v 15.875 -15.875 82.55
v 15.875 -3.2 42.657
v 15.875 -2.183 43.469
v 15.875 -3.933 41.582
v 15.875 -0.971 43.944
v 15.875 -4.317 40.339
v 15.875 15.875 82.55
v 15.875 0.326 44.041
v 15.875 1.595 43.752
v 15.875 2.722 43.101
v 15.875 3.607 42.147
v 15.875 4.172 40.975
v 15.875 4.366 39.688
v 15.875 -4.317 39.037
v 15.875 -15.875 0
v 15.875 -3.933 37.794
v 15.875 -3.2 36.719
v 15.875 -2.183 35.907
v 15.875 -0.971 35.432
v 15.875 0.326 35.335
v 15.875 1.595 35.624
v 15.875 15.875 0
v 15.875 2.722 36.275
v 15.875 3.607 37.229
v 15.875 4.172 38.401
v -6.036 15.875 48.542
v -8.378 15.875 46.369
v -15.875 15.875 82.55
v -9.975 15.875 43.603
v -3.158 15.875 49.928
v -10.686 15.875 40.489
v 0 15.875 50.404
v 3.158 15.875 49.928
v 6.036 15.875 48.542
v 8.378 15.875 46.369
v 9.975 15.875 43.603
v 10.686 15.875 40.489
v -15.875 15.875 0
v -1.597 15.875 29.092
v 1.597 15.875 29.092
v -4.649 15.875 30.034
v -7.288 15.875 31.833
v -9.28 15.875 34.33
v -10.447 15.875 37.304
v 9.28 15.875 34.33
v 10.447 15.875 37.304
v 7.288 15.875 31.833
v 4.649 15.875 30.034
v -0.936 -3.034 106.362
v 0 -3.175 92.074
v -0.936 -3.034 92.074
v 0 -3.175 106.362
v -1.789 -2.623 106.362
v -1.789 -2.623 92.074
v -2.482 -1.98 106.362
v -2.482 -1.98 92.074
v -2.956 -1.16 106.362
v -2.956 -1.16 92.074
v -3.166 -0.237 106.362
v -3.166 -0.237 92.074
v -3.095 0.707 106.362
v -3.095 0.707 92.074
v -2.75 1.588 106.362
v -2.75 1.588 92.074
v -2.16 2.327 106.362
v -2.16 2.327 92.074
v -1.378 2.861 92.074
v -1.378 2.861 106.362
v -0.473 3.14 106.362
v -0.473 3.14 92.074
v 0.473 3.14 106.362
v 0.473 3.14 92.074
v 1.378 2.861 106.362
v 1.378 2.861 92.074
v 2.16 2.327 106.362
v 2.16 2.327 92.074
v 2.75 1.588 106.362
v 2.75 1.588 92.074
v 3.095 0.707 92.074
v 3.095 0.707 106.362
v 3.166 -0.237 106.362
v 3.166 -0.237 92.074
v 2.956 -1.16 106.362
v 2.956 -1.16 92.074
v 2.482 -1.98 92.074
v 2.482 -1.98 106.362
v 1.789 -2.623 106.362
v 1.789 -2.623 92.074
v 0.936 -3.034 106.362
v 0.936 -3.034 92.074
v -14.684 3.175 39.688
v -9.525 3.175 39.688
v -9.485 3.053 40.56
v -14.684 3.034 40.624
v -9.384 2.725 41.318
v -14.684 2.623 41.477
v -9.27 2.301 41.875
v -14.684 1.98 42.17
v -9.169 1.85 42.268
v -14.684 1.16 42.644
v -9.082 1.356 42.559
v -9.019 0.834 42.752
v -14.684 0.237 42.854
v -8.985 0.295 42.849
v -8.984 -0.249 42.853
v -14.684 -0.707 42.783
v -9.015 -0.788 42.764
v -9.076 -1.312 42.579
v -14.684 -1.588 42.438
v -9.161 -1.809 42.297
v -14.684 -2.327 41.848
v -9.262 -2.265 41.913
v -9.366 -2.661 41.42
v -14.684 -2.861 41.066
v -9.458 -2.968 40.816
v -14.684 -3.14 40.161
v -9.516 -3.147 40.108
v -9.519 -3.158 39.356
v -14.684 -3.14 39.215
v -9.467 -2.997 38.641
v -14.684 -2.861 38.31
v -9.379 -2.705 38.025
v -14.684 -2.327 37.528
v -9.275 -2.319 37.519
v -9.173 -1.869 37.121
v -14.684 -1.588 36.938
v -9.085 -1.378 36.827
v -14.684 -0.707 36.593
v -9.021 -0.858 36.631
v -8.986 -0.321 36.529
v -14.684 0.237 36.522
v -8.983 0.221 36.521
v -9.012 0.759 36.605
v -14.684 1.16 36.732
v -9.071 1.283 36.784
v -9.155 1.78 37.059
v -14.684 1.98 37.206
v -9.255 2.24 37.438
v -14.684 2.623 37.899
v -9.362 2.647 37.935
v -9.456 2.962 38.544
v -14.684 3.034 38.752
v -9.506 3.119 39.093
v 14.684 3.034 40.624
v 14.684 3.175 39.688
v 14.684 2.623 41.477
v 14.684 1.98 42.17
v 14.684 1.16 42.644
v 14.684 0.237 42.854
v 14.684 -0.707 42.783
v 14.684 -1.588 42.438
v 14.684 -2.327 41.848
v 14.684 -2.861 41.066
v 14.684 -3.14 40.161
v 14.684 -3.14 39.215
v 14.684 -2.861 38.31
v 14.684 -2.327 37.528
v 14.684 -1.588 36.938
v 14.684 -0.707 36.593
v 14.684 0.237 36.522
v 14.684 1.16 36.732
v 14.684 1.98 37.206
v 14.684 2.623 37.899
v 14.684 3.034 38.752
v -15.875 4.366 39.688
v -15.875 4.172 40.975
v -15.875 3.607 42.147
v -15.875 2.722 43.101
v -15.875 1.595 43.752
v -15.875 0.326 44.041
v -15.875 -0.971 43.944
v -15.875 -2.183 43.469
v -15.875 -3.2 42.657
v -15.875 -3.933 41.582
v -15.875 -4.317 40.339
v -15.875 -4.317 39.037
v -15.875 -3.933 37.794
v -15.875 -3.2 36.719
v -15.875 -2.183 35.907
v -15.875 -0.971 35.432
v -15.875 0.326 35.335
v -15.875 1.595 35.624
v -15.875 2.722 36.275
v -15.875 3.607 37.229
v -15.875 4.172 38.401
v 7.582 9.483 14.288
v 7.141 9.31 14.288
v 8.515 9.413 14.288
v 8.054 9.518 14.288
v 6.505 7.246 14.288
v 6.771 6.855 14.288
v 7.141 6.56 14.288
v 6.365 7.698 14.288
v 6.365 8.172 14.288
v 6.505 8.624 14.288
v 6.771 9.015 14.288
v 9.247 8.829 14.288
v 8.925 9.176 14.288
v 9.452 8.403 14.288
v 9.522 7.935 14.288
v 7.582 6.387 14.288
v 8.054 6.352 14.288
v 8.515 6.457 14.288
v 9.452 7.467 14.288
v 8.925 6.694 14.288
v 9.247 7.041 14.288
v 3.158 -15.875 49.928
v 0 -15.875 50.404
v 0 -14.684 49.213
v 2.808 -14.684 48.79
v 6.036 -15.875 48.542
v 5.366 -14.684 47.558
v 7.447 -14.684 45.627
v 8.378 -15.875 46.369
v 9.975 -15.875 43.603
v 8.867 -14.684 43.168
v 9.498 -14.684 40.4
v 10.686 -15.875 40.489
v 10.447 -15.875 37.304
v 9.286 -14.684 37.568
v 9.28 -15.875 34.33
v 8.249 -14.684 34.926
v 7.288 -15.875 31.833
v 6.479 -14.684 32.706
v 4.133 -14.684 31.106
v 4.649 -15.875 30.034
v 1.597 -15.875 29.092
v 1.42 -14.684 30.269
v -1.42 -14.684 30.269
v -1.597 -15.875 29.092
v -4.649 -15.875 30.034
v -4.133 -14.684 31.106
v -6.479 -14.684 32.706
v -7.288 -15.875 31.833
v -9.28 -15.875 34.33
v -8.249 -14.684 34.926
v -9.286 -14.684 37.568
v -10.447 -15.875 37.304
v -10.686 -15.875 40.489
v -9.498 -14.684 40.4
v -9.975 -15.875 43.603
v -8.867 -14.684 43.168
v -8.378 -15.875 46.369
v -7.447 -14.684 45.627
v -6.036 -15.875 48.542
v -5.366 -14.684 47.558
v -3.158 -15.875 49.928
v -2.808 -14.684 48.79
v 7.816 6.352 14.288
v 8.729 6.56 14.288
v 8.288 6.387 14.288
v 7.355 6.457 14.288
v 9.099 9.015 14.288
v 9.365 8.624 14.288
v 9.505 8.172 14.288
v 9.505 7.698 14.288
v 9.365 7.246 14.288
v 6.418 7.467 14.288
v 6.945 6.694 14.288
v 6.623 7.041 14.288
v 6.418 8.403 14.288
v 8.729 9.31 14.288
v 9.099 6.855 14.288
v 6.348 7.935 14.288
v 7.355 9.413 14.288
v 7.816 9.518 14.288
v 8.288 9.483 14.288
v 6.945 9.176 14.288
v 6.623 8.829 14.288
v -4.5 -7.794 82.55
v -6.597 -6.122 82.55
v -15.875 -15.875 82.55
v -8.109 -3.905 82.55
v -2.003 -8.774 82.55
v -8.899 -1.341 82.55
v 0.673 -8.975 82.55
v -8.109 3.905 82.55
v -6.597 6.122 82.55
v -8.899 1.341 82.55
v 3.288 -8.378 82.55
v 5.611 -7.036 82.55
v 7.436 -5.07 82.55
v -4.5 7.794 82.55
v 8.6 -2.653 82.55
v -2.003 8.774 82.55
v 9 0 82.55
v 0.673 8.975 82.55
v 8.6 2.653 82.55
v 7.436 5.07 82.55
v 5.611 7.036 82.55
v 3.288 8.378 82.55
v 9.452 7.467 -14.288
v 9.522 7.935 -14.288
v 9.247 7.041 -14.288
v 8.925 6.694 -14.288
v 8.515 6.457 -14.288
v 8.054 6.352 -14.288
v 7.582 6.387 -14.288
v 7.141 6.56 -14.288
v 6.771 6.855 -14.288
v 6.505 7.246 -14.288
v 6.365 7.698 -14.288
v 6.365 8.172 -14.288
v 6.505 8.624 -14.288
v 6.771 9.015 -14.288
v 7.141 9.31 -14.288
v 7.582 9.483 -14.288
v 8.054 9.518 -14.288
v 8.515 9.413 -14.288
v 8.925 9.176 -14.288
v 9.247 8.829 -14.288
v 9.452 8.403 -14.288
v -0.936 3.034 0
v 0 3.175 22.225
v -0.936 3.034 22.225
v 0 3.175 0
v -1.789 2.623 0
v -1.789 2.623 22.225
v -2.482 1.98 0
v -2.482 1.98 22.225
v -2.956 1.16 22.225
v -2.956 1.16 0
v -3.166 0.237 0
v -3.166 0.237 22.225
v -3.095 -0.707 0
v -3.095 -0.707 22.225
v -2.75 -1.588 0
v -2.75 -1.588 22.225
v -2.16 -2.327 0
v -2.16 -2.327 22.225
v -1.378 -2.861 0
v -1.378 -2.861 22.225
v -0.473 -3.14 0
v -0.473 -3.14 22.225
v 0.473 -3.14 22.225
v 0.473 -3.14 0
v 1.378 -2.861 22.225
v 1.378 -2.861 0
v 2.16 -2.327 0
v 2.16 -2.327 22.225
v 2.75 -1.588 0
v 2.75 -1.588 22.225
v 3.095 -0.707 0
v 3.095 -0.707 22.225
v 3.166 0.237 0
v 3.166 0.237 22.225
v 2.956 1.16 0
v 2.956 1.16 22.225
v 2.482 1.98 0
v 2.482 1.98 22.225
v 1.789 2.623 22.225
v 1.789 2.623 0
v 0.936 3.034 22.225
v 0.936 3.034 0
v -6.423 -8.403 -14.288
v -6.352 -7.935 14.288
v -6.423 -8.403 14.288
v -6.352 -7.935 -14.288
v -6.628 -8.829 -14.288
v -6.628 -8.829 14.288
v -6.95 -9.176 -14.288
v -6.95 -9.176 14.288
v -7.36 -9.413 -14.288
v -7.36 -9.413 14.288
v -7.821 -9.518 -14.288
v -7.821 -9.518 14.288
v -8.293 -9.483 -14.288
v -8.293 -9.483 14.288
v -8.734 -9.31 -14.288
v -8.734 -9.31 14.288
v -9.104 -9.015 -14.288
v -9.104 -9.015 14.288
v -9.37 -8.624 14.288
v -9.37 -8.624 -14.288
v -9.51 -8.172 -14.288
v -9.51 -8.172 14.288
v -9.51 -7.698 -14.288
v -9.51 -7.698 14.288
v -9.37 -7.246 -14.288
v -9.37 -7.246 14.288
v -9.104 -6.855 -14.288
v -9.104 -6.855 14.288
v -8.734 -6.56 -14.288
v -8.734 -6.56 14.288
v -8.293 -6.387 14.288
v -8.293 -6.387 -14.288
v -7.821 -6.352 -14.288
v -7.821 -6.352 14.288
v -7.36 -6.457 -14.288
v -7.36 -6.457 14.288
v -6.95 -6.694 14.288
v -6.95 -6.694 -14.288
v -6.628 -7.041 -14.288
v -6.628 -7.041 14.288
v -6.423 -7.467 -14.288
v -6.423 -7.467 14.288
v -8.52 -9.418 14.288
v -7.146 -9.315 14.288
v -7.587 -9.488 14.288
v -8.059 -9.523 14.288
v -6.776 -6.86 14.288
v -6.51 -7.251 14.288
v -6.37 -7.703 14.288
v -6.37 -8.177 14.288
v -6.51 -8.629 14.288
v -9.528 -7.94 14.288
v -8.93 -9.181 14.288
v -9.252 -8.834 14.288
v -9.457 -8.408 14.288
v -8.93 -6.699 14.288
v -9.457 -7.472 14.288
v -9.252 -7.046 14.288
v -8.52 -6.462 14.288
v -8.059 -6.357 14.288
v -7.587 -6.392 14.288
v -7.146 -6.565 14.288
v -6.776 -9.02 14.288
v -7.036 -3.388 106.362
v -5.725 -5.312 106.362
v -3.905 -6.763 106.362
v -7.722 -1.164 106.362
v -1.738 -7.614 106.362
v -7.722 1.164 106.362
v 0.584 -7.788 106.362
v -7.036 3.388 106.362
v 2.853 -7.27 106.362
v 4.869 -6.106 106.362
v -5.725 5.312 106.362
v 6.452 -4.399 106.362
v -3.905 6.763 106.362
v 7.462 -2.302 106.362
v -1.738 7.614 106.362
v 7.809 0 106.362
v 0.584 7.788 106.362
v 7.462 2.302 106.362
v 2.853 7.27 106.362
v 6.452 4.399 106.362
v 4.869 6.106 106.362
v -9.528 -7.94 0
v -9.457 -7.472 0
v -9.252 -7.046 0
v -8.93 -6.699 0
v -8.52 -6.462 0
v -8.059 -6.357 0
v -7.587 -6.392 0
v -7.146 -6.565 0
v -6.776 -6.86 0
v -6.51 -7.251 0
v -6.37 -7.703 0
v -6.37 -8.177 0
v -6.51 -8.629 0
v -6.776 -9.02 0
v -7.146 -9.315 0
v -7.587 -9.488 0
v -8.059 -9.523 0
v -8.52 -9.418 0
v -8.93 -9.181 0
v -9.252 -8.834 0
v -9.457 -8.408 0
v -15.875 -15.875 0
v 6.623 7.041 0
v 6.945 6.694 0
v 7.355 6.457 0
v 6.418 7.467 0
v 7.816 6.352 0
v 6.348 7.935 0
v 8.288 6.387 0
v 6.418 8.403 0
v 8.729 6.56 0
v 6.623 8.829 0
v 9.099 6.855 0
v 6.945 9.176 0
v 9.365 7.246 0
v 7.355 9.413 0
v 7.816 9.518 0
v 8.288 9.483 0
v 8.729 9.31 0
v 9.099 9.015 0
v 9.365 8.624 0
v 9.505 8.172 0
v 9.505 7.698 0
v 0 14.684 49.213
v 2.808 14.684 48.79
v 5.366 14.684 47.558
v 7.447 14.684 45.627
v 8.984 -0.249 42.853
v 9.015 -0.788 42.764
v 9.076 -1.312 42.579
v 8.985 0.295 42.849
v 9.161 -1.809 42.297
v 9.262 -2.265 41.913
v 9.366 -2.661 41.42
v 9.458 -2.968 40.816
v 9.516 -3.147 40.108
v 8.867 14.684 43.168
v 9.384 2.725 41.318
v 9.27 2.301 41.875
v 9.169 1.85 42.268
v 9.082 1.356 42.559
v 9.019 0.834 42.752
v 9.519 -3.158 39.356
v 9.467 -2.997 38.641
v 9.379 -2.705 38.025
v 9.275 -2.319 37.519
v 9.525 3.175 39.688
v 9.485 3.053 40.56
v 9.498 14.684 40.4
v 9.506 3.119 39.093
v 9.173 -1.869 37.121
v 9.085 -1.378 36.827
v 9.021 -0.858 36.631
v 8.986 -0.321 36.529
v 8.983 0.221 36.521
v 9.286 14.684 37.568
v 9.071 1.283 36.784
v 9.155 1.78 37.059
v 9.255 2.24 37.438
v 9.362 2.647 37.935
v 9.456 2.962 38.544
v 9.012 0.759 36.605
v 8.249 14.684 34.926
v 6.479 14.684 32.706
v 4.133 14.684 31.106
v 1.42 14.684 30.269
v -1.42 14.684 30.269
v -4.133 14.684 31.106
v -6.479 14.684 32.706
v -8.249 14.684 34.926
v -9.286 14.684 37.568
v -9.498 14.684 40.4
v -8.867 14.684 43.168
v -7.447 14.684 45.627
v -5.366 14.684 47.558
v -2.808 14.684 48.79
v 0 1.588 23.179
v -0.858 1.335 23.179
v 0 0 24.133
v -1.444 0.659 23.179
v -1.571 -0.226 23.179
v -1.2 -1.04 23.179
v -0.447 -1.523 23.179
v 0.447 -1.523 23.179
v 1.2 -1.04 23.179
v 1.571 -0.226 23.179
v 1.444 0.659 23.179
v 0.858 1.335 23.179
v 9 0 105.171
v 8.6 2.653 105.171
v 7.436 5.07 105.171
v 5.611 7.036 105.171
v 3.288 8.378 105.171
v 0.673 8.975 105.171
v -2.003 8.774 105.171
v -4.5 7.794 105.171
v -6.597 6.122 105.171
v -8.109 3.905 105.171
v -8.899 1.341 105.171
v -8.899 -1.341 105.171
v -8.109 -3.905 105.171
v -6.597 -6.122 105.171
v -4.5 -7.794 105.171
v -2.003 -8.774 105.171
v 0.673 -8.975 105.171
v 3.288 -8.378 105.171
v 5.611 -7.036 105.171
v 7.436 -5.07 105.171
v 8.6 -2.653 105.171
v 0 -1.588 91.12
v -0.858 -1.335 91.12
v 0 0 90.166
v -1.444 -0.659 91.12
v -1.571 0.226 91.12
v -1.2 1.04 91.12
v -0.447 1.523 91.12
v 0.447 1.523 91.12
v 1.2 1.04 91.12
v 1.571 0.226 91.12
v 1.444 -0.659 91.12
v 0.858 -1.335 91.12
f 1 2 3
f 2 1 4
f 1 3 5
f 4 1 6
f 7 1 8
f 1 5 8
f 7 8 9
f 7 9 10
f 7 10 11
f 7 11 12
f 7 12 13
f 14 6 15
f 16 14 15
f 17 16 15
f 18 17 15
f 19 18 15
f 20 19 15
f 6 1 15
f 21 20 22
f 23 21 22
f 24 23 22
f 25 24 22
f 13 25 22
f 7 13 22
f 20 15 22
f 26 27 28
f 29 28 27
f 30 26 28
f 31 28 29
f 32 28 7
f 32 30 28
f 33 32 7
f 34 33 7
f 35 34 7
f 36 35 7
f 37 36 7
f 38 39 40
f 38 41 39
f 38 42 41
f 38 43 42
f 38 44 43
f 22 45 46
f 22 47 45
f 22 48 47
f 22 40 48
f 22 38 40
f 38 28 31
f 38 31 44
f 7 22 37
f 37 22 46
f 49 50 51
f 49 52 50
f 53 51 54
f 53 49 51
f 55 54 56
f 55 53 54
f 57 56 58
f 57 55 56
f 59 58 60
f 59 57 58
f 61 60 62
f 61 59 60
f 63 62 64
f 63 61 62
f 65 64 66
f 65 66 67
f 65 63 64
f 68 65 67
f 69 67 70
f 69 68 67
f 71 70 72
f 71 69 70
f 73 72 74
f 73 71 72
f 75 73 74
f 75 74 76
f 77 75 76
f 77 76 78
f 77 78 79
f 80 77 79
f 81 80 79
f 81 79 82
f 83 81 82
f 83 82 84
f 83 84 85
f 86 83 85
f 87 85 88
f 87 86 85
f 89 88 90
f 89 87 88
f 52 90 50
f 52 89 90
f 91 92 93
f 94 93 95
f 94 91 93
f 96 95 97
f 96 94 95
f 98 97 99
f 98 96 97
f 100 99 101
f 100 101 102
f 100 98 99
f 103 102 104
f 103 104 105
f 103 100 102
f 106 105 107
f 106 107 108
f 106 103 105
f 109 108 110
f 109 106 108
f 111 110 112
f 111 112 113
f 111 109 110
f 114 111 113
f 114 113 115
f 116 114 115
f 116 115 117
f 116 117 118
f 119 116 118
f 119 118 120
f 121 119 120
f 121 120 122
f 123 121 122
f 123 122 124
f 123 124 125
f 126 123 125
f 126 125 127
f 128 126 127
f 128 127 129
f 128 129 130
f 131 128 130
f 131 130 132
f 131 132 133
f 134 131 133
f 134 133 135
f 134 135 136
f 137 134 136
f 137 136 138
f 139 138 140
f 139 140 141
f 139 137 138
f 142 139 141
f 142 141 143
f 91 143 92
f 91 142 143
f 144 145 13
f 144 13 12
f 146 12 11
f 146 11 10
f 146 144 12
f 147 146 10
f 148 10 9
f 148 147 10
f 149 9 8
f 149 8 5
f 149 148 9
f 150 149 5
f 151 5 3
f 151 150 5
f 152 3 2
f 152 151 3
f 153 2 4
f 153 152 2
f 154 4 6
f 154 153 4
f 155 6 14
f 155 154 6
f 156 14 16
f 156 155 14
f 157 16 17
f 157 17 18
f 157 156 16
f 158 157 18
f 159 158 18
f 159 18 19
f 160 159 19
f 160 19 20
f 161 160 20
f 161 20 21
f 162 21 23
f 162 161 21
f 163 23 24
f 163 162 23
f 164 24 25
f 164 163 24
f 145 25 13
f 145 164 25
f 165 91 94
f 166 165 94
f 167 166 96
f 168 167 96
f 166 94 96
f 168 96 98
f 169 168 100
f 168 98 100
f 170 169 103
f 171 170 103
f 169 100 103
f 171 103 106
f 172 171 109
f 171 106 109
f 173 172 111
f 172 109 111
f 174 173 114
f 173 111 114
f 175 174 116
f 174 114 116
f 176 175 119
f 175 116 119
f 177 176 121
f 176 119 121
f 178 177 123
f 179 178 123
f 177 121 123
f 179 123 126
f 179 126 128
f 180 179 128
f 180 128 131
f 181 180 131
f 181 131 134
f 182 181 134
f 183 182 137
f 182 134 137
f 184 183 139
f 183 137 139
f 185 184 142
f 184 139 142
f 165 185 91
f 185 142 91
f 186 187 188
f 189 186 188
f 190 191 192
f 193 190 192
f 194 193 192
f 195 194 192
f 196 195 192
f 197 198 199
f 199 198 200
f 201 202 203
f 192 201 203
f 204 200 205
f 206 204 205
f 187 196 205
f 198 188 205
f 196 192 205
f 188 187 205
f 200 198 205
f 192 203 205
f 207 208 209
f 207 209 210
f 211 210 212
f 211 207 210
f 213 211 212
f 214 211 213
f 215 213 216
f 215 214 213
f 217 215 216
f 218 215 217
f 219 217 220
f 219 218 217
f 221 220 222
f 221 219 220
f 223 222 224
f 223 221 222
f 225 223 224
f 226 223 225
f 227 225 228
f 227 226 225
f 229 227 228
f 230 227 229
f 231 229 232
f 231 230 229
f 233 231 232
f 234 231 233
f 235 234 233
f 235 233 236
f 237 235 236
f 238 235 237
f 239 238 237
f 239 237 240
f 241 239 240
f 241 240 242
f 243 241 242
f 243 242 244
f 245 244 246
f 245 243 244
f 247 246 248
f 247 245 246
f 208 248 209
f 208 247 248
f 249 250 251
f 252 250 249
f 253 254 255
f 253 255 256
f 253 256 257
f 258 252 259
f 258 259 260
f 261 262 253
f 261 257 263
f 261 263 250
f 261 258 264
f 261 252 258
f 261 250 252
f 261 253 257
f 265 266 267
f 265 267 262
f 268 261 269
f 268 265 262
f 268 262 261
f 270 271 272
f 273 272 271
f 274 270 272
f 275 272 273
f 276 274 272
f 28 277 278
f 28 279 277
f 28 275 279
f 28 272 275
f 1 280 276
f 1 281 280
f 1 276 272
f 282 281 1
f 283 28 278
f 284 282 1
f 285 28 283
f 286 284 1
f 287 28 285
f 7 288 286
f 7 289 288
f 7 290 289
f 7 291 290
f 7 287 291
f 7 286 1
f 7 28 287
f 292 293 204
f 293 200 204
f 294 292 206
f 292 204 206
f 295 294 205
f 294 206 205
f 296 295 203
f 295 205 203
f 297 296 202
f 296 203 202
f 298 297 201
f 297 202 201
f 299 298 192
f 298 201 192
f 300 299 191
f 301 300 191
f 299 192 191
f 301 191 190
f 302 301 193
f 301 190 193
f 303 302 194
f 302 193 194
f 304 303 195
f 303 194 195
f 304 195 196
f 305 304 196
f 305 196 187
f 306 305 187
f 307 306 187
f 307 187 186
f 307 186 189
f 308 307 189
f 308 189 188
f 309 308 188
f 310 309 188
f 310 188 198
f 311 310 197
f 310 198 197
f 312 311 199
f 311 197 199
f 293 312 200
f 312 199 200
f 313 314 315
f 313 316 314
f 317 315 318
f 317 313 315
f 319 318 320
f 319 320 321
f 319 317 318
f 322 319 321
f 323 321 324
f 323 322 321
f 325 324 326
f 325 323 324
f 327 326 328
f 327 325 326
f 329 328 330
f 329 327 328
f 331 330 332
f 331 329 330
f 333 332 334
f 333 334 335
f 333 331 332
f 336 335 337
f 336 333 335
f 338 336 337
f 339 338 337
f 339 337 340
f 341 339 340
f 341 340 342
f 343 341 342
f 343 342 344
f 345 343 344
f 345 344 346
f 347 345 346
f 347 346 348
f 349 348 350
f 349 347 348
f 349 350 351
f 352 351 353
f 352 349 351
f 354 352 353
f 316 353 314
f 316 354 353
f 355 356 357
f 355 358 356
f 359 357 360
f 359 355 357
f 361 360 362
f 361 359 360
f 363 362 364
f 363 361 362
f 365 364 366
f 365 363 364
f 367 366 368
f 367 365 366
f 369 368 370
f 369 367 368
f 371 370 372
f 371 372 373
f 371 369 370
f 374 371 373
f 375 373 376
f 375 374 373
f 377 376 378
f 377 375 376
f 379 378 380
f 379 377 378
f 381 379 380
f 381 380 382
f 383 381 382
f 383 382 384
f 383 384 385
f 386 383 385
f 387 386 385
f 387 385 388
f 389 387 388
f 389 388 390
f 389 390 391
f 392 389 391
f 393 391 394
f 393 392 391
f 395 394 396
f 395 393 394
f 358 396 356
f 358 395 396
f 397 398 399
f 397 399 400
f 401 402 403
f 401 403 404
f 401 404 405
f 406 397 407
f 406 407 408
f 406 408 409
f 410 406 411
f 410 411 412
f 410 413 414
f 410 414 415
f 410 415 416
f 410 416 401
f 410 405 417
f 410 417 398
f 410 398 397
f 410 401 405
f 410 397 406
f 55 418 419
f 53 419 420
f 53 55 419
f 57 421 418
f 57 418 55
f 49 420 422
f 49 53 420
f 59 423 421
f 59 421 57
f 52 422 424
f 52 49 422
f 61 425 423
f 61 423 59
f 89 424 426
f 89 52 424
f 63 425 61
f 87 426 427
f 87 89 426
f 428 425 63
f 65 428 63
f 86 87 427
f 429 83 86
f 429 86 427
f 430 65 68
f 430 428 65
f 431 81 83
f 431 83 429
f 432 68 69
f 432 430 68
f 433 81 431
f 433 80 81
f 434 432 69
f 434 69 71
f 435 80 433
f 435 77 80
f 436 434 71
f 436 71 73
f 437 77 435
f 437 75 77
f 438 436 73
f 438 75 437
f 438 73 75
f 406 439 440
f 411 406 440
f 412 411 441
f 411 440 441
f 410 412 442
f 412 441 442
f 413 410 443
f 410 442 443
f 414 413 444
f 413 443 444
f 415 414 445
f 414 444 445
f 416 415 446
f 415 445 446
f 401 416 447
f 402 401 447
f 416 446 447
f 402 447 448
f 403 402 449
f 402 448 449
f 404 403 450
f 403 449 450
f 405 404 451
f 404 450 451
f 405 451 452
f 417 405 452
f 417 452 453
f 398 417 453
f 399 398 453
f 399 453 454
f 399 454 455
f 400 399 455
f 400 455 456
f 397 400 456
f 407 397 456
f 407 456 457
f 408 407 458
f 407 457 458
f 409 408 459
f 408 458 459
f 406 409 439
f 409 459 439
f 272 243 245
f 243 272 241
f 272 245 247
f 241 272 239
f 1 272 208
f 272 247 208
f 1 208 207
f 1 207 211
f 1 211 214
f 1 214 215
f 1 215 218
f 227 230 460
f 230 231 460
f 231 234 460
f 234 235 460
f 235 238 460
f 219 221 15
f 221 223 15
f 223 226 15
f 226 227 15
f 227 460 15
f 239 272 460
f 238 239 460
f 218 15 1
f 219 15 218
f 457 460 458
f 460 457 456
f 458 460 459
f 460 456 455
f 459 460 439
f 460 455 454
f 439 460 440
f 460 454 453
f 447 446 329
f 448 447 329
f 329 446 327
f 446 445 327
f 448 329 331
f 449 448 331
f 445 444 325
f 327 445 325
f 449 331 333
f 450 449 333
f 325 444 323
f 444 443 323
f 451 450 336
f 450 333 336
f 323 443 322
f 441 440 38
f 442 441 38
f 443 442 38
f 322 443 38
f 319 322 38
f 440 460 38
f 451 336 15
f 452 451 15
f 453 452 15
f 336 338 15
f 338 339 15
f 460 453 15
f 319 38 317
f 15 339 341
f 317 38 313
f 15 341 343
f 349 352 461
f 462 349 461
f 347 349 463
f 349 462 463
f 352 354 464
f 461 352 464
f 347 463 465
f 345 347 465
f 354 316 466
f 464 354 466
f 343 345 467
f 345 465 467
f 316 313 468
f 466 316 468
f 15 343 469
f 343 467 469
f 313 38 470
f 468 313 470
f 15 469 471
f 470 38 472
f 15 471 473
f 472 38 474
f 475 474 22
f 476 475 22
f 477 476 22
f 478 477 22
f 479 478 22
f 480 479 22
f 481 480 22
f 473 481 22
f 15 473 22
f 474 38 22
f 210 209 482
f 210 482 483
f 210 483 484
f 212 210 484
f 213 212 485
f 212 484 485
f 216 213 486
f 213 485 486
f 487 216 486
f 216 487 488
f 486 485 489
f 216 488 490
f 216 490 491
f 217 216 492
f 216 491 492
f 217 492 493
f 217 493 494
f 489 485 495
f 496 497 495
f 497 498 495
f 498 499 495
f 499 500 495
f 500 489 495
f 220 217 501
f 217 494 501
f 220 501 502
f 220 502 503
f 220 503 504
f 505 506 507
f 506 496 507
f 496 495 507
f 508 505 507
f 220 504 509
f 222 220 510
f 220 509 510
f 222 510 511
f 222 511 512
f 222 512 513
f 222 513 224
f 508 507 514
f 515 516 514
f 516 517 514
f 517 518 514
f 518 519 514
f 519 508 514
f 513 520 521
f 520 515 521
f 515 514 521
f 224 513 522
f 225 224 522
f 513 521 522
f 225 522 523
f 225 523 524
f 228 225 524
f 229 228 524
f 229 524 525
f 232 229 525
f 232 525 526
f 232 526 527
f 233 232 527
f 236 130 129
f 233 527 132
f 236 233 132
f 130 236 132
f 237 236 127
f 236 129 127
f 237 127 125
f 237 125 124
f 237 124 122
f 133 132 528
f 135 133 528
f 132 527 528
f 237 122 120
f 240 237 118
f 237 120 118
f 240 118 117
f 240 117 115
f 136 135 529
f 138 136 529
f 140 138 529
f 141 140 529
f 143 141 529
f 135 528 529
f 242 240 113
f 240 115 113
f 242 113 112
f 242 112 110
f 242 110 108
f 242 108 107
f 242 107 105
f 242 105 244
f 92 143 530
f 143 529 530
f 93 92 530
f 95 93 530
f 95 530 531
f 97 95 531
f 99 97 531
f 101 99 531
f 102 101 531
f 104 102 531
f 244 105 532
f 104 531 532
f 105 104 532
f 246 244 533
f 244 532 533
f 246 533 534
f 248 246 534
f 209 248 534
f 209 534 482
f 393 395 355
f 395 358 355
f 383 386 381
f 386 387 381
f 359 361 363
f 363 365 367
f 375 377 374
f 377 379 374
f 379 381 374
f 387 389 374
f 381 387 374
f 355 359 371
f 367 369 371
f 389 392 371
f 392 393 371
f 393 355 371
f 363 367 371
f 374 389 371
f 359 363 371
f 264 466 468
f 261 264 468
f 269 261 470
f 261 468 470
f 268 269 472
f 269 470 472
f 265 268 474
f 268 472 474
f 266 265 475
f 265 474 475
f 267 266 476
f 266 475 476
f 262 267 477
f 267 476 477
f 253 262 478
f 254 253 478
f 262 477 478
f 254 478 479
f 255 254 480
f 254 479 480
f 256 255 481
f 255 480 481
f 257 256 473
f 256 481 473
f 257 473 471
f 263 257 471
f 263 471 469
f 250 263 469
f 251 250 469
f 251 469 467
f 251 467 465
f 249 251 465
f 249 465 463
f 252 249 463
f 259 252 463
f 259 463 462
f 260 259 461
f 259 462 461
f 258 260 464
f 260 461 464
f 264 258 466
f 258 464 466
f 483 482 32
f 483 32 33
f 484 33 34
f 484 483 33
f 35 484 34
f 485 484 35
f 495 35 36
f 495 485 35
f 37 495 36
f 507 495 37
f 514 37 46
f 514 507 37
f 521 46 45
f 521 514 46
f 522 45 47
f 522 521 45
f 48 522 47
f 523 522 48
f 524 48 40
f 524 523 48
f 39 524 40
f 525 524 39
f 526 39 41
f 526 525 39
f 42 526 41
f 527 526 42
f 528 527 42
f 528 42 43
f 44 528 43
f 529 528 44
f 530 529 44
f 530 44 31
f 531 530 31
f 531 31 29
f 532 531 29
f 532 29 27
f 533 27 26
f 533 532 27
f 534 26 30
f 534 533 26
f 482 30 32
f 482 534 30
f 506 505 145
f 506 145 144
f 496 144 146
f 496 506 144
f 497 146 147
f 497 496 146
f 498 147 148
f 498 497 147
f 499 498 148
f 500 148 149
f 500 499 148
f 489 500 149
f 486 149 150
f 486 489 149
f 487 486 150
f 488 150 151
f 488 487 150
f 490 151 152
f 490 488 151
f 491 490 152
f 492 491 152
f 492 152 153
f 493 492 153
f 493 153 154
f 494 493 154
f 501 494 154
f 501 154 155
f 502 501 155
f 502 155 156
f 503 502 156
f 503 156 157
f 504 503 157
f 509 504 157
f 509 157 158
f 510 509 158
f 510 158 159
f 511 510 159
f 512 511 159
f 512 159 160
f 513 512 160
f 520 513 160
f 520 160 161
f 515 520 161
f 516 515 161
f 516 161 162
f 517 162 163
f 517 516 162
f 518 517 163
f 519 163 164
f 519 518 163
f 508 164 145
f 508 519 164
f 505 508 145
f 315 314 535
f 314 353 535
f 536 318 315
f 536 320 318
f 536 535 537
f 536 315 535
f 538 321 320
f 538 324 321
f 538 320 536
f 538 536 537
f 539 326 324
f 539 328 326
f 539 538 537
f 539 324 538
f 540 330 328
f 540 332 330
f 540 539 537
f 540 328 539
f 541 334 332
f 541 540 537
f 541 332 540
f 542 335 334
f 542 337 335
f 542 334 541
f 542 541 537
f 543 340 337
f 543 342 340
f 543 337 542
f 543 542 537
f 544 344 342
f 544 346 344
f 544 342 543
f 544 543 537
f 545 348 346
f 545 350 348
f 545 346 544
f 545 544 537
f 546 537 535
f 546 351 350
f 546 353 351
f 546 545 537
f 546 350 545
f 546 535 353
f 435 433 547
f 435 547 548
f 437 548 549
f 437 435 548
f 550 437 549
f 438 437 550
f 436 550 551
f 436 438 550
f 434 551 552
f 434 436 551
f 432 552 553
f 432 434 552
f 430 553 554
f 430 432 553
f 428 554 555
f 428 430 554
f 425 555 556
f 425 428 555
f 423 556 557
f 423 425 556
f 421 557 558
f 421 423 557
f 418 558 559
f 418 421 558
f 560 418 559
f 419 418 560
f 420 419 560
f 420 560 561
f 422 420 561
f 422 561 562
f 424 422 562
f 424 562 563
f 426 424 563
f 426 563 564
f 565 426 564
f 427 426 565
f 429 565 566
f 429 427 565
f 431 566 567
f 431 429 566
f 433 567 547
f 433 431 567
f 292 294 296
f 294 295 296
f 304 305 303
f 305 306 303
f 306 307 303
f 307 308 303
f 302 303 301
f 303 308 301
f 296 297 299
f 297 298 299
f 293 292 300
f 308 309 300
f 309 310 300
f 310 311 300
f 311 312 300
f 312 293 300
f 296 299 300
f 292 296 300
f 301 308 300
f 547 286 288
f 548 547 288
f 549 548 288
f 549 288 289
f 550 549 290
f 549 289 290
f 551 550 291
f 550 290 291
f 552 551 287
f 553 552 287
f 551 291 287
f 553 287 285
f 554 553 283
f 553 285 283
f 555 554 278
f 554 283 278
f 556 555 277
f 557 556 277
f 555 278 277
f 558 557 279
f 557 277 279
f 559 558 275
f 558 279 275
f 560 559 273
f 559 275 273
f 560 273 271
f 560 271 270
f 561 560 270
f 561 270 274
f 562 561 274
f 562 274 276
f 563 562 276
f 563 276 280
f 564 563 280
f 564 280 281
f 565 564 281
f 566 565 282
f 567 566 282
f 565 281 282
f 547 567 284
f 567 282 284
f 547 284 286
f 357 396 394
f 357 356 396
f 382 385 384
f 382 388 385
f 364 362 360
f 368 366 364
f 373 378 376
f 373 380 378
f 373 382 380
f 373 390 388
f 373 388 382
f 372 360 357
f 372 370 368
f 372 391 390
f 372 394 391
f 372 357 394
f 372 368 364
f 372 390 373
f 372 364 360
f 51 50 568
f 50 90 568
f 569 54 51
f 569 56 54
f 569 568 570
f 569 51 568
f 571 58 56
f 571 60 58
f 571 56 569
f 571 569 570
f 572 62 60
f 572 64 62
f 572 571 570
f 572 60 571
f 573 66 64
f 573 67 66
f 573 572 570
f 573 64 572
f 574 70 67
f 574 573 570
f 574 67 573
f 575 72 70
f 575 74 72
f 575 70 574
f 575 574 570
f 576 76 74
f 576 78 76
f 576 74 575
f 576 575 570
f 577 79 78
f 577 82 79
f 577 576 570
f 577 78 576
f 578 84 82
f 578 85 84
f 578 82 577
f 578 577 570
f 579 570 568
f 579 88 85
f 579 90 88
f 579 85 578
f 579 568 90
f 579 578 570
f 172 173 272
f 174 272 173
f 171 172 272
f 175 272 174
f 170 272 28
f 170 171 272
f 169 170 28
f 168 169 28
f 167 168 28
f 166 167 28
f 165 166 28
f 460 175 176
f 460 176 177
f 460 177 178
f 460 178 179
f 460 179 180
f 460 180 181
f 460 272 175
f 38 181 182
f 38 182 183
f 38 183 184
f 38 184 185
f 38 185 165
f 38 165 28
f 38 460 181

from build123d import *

# Parameters (mm, degrees)
CROQUIS1_W                               = 31.75
CROQUIS1_H                               = 31.75
SALIENTE_EXTRUIR1_DEPTH                  = 82.55
CORTAR_EXTRUIR2_REACH                    = 91.859
CROQUIS2_R                               = 9.525
CROQUIS3_R                               = 9
SALIENTE_EXTRUIR2_DEPTH                  = 23.812
CROQUIS4_R                               = 1.5875
CORTAR_EXTRUIR3_DEPTH                    = 14.288
CROQUIS7_W                               = 1.5875
CROQUIS7_H                               = 28.576
DI_METRO_START                           = -15.875
DI_METRO_DE_TALADRO_1_4_0_25_1_OUTLINE_R = 3.175
DI_METRO_DE_TALADRO_1_4_0_25_1_DEPTH     = 31.75
CHAFL_N2_SIZE                            = 1.190625
CHAFL_N3_SIZE                            = 1.190625
CHAFL_N4_SIZE                            = 1.190625
CHAFL_N5_SIZE                            = 1.190625


# Read off the part's stored shape, not the designer's step: Diámetro de taladro 1/4 (0.25)1
with BuildPart() as part:
    # Croquis1 → Saliente-Extruir1 (new body)
    with BuildSketch(Plane.XY):
        Rectangle(CROQUIS1_W, CROQUIS1_H)
    extrude(amount=SALIENTE_EXTRUIR1_DEPTH)

    # Croquis2 → Cortar-Extruir2 (cut, up to next)
    with BuildSketch(Plane(origin=(0, 15.875, 0), x_dir=(1, 0, 0), z_dir=(0, 1, 0)), mode=Mode.PRIVATE) as cortar_extruir2_sk1:
        with Locations(Location((0, -39.688, 0), (0, 0, 270))):
            Circle(CROQUIS2_R)
    cortar_extruir2_tool1 = extrude(cortar_extruir2_sk1.sketch, amount=-CORTAR_EXTRUIR2_REACH, mode=Mode.PRIVATE) & part.part
    add(cortar_extruir2_tool1.solids().sort_by_distance((0, 15.875, 39.688))[0], mode=Mode.SUBTRACT)

    # Croquis3 → Saliente-Extruir2 (add)
    with BuildSketch(Plane.XY.offset(82.55)):
        Circle(CROQUIS3_R)
    extrude(amount=SALIENTE_EXTRUIR2_DEPTH)

    # Croquis4 → Cortar-Extruir3 (cut)
    with BuildSketch(Plane(origin=(0, 0, 0), x_dir=(-1, 0, 0), z_dir=(0, 0, -1))):
        with Locations((-7.935, 7.935)):
            Circle(CROQUIS4_R)
        with Locations((7.94, -7.94)):
            Circle(CROQUIS4_R)
    extrude(amount=-CORTAR_EXTRUIR3_DEPTH, mode=Mode.SUBTRACT)

    # Croquis8 → Taladro roscado 1/4-201 (revolve, cut)
    with BuildSketch(Plane(origin=(0, 0, 106.362), x_dir=(0, -1, 0), z_dir=(1, 0, 0))):
        Polygon((0, 0), (0, 16.195732465), (3.175, 14.288), (3.175, 0), align=None)
    revolve(axis=Axis((0, 0, 112.712), (0, 0, -1)), mode=Mode.SUBTRACT)

    # Diámetro de taladro 1/4 (0.25)1 outline → Diámetro de taladro 1/4 (0.25)1 (cut)
    with BuildSketch(Plane.YZ.offset(DI_METRO_START)):
        with Locations((0, 39.688)):
            Circle(DI_METRO_DE_TALADRO_1_4_0_25_1_OUTLINE_R)
    extrude(amount=DI_METRO_DE_TALADRO_1_4_0_25_1_DEPTH, mode=Mode.SUBTRACT)

    # Chaflán2
    chafl_n2_edges = [part.edges().sort_by_distance(p)[0] for p in [
        (0, 15.875, 30.163),
    ]]
    chamfer(chafl_n2_edges, length=CHAFL_N2_SIZE)

    # Chaflán3
    chafl_n3_edges = [part.edges().sort_by_distance(p)[0] for p in [
        (0, -15.875, 30.163),
    ]]
    chamfer(chafl_n3_edges, length=CHAFL_N3_SIZE)

    # Chaflán4
    chafl_n4_edges = [part.edges().sort_by_distance(p)[0] for p in [
        (-9, 0, 106.362),
    ]]
    chamfer(chafl_n4_edges, length=CHAFL_N4_SIZE)

    # Chaflán5
    chafl_n5_edges = [part.edges().sort_by_distance(p)[0] for p in [
        (-15.875, -3.175, 39.688),
        (15.875, -3.175, 39.688),
    ]]
    chamfer(chafl_n5_edges, length=CHAFL_N5_SIZE)

    # Croquis11 → Taladro roscado 1/4-202 (revolve, cut)
    with BuildSketch(Plane.YZ):
        Polygon((0, 0), (0, 24.132732465), (3.175, 22.225), (3.175, 0), align=None)
    revolve(axis=Axis((0, 0, -6.35), (0, 0, 1)), mode=Mode.SUBTRACT)


with BuildPart() as body_2:
    # Croquis6 → Revolución1 (revolve)
    with BuildSketch(Plane(origin=(0, 7.935, 0), x_dir=(1, 0, 0), z_dir=(0, 1, 0)), mode=Mode.PRIVATE) as revoluci_n1_sk:
        Polygon((6.3475, 0), (6.3475, -14.288), (7.935, -14.288), (7.935, 14.288), (6.3475, 14.288), align=None)
    revolve(revoluci_n1_sk.sketch.rotate(Axis((7.935, 7.935, 14.288), (0, 0, -1)), 180), axis=Axis((7.935, 7.935, 14.288), (0, 0, -1)))


with BuildPart() as body_3:
    # Croquis7 → Revolución2 (revolve)
    with BuildSketch(Plane(origin=(0, -7.935, 0), x_dir=(-1, 0, 0), z_dir=(0, -1, 0)), mode=Mode.PRIVATE) as revoluci_n2_sk:
        with Locations((8.73375, 0)):
            Rectangle(CROQUIS7_W, CROQUIS7_H)
    revolve(revoluci_n2_sk.sketch.rotate(Axis((-7.94, -7.935, 14.288), (0, 0, -1)), 180), axis=Axis((-7.94, -7.935, 14.288), (0, 0, -1)))


solid = Compound([part.part, body_2.part, body_3.part])
